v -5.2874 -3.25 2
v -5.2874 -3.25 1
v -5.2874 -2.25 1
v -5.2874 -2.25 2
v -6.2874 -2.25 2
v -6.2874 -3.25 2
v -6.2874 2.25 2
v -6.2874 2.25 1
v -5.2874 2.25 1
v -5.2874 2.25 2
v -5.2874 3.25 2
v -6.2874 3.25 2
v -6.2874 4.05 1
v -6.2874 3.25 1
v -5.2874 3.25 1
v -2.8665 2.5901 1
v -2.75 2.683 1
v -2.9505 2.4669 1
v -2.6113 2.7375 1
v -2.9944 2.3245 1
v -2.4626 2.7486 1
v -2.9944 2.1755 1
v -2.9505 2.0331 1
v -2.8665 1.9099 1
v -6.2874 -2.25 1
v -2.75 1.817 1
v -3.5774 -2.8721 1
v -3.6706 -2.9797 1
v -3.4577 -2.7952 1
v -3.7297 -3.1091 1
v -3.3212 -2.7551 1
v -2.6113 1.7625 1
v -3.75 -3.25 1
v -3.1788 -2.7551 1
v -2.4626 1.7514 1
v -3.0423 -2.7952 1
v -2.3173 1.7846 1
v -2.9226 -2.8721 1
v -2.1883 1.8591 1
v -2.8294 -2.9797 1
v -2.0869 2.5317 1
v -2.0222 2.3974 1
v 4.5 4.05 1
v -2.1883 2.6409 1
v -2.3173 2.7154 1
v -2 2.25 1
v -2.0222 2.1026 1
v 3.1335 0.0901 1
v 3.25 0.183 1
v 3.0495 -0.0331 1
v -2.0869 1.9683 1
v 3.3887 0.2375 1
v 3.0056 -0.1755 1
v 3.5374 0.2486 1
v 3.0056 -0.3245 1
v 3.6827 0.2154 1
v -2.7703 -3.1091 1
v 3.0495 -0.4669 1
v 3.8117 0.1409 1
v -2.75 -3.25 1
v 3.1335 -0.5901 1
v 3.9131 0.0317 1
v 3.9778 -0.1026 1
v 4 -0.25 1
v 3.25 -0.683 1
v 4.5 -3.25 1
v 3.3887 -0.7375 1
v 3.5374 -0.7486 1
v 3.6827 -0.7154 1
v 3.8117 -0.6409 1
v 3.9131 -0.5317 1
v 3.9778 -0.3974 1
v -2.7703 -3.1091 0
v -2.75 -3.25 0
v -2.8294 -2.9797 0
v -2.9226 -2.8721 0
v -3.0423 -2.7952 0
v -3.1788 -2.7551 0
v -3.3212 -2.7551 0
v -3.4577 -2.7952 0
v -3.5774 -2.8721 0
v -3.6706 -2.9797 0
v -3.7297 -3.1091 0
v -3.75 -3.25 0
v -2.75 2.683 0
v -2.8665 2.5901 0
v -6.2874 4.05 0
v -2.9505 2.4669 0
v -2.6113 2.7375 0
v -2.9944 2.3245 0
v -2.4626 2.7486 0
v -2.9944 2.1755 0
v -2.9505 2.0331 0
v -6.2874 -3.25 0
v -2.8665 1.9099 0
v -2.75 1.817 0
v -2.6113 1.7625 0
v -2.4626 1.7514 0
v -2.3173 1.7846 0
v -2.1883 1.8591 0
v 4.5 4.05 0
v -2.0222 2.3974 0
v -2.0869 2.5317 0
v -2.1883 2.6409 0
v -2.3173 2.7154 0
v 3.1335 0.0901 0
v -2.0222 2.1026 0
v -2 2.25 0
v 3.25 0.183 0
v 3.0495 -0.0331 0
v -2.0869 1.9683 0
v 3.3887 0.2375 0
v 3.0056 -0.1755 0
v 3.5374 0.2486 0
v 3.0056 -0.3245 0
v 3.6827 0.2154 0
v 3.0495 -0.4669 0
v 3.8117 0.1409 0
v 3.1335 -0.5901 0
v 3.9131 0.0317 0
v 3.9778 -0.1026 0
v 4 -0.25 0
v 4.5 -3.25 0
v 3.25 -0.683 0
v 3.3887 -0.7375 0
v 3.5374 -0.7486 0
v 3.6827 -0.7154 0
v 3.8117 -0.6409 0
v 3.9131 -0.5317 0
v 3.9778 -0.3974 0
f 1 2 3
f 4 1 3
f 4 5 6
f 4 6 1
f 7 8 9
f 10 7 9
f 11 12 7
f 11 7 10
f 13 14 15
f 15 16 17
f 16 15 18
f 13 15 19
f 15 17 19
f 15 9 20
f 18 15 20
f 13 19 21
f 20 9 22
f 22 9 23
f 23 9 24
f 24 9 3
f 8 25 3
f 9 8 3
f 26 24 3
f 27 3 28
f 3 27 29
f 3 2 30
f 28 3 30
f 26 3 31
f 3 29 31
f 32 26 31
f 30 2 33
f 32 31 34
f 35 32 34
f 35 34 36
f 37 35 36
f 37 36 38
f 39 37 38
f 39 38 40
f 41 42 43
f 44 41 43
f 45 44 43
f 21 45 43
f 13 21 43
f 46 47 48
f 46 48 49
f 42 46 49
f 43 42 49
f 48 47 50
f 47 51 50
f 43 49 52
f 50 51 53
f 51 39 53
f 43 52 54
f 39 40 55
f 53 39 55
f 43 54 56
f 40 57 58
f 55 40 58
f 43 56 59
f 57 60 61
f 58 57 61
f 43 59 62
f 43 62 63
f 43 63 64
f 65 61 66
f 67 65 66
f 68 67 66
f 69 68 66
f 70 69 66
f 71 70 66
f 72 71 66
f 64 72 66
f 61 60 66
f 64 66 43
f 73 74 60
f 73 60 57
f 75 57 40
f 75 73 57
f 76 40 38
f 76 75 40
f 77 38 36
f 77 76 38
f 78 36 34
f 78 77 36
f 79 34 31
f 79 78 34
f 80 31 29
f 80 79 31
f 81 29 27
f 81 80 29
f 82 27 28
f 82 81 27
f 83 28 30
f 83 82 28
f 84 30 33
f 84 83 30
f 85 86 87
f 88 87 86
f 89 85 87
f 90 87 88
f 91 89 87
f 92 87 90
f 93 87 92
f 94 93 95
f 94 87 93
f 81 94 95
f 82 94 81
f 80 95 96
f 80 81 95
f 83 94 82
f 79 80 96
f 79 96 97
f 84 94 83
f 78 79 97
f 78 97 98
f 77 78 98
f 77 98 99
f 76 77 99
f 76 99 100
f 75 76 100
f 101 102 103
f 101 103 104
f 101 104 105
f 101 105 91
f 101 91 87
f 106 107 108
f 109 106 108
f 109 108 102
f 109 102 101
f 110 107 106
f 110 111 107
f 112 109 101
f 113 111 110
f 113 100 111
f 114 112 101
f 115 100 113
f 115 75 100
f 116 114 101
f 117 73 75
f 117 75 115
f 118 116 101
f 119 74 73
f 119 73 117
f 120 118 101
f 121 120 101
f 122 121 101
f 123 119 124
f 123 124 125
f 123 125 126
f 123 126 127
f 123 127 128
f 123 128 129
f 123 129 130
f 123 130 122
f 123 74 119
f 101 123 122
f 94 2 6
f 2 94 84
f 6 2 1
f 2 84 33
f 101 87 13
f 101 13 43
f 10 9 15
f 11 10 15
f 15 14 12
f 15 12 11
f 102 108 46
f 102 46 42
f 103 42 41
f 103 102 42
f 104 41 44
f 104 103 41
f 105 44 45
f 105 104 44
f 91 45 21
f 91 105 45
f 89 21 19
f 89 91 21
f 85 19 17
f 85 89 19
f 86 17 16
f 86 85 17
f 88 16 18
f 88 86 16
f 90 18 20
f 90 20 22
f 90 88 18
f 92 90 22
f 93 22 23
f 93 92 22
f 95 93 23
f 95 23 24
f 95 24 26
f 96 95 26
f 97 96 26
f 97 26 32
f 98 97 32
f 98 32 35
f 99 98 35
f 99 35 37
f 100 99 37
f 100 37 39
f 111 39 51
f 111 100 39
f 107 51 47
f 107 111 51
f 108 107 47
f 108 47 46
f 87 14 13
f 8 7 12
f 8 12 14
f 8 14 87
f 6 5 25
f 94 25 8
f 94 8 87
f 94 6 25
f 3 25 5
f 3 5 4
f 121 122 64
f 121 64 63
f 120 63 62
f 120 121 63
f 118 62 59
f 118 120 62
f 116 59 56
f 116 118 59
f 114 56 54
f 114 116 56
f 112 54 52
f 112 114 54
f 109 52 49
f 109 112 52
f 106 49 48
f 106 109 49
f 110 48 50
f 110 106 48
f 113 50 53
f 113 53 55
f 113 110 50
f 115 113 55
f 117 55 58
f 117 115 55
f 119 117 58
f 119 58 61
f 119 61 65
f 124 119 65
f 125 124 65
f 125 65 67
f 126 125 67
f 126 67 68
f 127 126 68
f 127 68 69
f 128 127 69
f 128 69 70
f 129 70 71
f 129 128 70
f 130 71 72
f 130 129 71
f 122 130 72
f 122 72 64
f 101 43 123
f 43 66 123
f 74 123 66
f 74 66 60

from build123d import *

# Parameters (mm, degrees)
SKETCH1_R            = 0.5
FRONT_FACE_EXT_DEPTH = 1
SKETCH2_W            = 1
SKETCH2_H            = 6.5
BOSS_EXTRUDE1_DEPTH  = 1.7874
SKETCH3_W            = 1
SKETCH3_H            = 1
BOSS_EXTRUDE2_DEPTH  = 1
SKETCH4_W            = 10.7874
SKETCH4_H            = 1
BOSS_EXTRUDE3_DEPTH  = 0.8


with BuildPart() as part:
    # Sketch1 → Front Face Ext (new body)
    with BuildSketch(Plane.XY):
        with BuildLine():
            Line((-3.75, -3.25), (-4.5, -3.25))
            Line((-4.5, -3.25), (-4.5, 3.25))
            Line((-4.5, 3.25), (4.5, 3.25))
            Line((4.5, 3.25), (4.5, -3.25))
            Line((4.5, -3.25), (-2.75, -3.25))
            ThreePointArc((-2.75, -3.25), (-3.25, -2.75), (-3.75, -3.25))
        make_face()
        with Locations((-2.5, 2.25)):
            Circle(SKETCH1_R, mode=Mode.SUBTRACT)
        with Locations((3.5, -0.25)):
            Circle(SKETCH1_R, mode=Mode.SUBTRACT)
    extrude(amount=FRONT_FACE_EXT_DEPTH)

    # Sketch2 → Boss-Extrude1 (add)
    with BuildSketch(Plane.ZY.offset(4.5)):
        with Locations((0.5, 0)):
            Rectangle(SKETCH2_W, SKETCH2_H)
    extrude(amount=BOSS_EXTRUDE1_DEPTH)

    # Sketch3 → Boss-Extrude2 (add)
    with BuildSketch(Plane.XY.offset(1)):
        with Locations((-5.7874, 2.75)):
            Rectangle(SKETCH3_W, SKETCH3_H)
        with Locations((-5.7874, -2.75)):
            Rectangle(SKETCH3_W, SKETCH3_H)
    extrude(amount=BOSS_EXTRUDE2_DEPTH)

    # Sketch4 → Boss-Extrude3 (add)
    with BuildSketch(Plane(origin=(0, 3.25, 0), x_dir=(1, 0, 0), z_dir=(0, 1, 0))):
        with Locations((-0.8937, -0.5)):
            Rectangle(SKETCH4_W, SKETCH4_H)
    extrude(amount=BOSS_EXTRUDE3_DEPTH)


solid = part.part
